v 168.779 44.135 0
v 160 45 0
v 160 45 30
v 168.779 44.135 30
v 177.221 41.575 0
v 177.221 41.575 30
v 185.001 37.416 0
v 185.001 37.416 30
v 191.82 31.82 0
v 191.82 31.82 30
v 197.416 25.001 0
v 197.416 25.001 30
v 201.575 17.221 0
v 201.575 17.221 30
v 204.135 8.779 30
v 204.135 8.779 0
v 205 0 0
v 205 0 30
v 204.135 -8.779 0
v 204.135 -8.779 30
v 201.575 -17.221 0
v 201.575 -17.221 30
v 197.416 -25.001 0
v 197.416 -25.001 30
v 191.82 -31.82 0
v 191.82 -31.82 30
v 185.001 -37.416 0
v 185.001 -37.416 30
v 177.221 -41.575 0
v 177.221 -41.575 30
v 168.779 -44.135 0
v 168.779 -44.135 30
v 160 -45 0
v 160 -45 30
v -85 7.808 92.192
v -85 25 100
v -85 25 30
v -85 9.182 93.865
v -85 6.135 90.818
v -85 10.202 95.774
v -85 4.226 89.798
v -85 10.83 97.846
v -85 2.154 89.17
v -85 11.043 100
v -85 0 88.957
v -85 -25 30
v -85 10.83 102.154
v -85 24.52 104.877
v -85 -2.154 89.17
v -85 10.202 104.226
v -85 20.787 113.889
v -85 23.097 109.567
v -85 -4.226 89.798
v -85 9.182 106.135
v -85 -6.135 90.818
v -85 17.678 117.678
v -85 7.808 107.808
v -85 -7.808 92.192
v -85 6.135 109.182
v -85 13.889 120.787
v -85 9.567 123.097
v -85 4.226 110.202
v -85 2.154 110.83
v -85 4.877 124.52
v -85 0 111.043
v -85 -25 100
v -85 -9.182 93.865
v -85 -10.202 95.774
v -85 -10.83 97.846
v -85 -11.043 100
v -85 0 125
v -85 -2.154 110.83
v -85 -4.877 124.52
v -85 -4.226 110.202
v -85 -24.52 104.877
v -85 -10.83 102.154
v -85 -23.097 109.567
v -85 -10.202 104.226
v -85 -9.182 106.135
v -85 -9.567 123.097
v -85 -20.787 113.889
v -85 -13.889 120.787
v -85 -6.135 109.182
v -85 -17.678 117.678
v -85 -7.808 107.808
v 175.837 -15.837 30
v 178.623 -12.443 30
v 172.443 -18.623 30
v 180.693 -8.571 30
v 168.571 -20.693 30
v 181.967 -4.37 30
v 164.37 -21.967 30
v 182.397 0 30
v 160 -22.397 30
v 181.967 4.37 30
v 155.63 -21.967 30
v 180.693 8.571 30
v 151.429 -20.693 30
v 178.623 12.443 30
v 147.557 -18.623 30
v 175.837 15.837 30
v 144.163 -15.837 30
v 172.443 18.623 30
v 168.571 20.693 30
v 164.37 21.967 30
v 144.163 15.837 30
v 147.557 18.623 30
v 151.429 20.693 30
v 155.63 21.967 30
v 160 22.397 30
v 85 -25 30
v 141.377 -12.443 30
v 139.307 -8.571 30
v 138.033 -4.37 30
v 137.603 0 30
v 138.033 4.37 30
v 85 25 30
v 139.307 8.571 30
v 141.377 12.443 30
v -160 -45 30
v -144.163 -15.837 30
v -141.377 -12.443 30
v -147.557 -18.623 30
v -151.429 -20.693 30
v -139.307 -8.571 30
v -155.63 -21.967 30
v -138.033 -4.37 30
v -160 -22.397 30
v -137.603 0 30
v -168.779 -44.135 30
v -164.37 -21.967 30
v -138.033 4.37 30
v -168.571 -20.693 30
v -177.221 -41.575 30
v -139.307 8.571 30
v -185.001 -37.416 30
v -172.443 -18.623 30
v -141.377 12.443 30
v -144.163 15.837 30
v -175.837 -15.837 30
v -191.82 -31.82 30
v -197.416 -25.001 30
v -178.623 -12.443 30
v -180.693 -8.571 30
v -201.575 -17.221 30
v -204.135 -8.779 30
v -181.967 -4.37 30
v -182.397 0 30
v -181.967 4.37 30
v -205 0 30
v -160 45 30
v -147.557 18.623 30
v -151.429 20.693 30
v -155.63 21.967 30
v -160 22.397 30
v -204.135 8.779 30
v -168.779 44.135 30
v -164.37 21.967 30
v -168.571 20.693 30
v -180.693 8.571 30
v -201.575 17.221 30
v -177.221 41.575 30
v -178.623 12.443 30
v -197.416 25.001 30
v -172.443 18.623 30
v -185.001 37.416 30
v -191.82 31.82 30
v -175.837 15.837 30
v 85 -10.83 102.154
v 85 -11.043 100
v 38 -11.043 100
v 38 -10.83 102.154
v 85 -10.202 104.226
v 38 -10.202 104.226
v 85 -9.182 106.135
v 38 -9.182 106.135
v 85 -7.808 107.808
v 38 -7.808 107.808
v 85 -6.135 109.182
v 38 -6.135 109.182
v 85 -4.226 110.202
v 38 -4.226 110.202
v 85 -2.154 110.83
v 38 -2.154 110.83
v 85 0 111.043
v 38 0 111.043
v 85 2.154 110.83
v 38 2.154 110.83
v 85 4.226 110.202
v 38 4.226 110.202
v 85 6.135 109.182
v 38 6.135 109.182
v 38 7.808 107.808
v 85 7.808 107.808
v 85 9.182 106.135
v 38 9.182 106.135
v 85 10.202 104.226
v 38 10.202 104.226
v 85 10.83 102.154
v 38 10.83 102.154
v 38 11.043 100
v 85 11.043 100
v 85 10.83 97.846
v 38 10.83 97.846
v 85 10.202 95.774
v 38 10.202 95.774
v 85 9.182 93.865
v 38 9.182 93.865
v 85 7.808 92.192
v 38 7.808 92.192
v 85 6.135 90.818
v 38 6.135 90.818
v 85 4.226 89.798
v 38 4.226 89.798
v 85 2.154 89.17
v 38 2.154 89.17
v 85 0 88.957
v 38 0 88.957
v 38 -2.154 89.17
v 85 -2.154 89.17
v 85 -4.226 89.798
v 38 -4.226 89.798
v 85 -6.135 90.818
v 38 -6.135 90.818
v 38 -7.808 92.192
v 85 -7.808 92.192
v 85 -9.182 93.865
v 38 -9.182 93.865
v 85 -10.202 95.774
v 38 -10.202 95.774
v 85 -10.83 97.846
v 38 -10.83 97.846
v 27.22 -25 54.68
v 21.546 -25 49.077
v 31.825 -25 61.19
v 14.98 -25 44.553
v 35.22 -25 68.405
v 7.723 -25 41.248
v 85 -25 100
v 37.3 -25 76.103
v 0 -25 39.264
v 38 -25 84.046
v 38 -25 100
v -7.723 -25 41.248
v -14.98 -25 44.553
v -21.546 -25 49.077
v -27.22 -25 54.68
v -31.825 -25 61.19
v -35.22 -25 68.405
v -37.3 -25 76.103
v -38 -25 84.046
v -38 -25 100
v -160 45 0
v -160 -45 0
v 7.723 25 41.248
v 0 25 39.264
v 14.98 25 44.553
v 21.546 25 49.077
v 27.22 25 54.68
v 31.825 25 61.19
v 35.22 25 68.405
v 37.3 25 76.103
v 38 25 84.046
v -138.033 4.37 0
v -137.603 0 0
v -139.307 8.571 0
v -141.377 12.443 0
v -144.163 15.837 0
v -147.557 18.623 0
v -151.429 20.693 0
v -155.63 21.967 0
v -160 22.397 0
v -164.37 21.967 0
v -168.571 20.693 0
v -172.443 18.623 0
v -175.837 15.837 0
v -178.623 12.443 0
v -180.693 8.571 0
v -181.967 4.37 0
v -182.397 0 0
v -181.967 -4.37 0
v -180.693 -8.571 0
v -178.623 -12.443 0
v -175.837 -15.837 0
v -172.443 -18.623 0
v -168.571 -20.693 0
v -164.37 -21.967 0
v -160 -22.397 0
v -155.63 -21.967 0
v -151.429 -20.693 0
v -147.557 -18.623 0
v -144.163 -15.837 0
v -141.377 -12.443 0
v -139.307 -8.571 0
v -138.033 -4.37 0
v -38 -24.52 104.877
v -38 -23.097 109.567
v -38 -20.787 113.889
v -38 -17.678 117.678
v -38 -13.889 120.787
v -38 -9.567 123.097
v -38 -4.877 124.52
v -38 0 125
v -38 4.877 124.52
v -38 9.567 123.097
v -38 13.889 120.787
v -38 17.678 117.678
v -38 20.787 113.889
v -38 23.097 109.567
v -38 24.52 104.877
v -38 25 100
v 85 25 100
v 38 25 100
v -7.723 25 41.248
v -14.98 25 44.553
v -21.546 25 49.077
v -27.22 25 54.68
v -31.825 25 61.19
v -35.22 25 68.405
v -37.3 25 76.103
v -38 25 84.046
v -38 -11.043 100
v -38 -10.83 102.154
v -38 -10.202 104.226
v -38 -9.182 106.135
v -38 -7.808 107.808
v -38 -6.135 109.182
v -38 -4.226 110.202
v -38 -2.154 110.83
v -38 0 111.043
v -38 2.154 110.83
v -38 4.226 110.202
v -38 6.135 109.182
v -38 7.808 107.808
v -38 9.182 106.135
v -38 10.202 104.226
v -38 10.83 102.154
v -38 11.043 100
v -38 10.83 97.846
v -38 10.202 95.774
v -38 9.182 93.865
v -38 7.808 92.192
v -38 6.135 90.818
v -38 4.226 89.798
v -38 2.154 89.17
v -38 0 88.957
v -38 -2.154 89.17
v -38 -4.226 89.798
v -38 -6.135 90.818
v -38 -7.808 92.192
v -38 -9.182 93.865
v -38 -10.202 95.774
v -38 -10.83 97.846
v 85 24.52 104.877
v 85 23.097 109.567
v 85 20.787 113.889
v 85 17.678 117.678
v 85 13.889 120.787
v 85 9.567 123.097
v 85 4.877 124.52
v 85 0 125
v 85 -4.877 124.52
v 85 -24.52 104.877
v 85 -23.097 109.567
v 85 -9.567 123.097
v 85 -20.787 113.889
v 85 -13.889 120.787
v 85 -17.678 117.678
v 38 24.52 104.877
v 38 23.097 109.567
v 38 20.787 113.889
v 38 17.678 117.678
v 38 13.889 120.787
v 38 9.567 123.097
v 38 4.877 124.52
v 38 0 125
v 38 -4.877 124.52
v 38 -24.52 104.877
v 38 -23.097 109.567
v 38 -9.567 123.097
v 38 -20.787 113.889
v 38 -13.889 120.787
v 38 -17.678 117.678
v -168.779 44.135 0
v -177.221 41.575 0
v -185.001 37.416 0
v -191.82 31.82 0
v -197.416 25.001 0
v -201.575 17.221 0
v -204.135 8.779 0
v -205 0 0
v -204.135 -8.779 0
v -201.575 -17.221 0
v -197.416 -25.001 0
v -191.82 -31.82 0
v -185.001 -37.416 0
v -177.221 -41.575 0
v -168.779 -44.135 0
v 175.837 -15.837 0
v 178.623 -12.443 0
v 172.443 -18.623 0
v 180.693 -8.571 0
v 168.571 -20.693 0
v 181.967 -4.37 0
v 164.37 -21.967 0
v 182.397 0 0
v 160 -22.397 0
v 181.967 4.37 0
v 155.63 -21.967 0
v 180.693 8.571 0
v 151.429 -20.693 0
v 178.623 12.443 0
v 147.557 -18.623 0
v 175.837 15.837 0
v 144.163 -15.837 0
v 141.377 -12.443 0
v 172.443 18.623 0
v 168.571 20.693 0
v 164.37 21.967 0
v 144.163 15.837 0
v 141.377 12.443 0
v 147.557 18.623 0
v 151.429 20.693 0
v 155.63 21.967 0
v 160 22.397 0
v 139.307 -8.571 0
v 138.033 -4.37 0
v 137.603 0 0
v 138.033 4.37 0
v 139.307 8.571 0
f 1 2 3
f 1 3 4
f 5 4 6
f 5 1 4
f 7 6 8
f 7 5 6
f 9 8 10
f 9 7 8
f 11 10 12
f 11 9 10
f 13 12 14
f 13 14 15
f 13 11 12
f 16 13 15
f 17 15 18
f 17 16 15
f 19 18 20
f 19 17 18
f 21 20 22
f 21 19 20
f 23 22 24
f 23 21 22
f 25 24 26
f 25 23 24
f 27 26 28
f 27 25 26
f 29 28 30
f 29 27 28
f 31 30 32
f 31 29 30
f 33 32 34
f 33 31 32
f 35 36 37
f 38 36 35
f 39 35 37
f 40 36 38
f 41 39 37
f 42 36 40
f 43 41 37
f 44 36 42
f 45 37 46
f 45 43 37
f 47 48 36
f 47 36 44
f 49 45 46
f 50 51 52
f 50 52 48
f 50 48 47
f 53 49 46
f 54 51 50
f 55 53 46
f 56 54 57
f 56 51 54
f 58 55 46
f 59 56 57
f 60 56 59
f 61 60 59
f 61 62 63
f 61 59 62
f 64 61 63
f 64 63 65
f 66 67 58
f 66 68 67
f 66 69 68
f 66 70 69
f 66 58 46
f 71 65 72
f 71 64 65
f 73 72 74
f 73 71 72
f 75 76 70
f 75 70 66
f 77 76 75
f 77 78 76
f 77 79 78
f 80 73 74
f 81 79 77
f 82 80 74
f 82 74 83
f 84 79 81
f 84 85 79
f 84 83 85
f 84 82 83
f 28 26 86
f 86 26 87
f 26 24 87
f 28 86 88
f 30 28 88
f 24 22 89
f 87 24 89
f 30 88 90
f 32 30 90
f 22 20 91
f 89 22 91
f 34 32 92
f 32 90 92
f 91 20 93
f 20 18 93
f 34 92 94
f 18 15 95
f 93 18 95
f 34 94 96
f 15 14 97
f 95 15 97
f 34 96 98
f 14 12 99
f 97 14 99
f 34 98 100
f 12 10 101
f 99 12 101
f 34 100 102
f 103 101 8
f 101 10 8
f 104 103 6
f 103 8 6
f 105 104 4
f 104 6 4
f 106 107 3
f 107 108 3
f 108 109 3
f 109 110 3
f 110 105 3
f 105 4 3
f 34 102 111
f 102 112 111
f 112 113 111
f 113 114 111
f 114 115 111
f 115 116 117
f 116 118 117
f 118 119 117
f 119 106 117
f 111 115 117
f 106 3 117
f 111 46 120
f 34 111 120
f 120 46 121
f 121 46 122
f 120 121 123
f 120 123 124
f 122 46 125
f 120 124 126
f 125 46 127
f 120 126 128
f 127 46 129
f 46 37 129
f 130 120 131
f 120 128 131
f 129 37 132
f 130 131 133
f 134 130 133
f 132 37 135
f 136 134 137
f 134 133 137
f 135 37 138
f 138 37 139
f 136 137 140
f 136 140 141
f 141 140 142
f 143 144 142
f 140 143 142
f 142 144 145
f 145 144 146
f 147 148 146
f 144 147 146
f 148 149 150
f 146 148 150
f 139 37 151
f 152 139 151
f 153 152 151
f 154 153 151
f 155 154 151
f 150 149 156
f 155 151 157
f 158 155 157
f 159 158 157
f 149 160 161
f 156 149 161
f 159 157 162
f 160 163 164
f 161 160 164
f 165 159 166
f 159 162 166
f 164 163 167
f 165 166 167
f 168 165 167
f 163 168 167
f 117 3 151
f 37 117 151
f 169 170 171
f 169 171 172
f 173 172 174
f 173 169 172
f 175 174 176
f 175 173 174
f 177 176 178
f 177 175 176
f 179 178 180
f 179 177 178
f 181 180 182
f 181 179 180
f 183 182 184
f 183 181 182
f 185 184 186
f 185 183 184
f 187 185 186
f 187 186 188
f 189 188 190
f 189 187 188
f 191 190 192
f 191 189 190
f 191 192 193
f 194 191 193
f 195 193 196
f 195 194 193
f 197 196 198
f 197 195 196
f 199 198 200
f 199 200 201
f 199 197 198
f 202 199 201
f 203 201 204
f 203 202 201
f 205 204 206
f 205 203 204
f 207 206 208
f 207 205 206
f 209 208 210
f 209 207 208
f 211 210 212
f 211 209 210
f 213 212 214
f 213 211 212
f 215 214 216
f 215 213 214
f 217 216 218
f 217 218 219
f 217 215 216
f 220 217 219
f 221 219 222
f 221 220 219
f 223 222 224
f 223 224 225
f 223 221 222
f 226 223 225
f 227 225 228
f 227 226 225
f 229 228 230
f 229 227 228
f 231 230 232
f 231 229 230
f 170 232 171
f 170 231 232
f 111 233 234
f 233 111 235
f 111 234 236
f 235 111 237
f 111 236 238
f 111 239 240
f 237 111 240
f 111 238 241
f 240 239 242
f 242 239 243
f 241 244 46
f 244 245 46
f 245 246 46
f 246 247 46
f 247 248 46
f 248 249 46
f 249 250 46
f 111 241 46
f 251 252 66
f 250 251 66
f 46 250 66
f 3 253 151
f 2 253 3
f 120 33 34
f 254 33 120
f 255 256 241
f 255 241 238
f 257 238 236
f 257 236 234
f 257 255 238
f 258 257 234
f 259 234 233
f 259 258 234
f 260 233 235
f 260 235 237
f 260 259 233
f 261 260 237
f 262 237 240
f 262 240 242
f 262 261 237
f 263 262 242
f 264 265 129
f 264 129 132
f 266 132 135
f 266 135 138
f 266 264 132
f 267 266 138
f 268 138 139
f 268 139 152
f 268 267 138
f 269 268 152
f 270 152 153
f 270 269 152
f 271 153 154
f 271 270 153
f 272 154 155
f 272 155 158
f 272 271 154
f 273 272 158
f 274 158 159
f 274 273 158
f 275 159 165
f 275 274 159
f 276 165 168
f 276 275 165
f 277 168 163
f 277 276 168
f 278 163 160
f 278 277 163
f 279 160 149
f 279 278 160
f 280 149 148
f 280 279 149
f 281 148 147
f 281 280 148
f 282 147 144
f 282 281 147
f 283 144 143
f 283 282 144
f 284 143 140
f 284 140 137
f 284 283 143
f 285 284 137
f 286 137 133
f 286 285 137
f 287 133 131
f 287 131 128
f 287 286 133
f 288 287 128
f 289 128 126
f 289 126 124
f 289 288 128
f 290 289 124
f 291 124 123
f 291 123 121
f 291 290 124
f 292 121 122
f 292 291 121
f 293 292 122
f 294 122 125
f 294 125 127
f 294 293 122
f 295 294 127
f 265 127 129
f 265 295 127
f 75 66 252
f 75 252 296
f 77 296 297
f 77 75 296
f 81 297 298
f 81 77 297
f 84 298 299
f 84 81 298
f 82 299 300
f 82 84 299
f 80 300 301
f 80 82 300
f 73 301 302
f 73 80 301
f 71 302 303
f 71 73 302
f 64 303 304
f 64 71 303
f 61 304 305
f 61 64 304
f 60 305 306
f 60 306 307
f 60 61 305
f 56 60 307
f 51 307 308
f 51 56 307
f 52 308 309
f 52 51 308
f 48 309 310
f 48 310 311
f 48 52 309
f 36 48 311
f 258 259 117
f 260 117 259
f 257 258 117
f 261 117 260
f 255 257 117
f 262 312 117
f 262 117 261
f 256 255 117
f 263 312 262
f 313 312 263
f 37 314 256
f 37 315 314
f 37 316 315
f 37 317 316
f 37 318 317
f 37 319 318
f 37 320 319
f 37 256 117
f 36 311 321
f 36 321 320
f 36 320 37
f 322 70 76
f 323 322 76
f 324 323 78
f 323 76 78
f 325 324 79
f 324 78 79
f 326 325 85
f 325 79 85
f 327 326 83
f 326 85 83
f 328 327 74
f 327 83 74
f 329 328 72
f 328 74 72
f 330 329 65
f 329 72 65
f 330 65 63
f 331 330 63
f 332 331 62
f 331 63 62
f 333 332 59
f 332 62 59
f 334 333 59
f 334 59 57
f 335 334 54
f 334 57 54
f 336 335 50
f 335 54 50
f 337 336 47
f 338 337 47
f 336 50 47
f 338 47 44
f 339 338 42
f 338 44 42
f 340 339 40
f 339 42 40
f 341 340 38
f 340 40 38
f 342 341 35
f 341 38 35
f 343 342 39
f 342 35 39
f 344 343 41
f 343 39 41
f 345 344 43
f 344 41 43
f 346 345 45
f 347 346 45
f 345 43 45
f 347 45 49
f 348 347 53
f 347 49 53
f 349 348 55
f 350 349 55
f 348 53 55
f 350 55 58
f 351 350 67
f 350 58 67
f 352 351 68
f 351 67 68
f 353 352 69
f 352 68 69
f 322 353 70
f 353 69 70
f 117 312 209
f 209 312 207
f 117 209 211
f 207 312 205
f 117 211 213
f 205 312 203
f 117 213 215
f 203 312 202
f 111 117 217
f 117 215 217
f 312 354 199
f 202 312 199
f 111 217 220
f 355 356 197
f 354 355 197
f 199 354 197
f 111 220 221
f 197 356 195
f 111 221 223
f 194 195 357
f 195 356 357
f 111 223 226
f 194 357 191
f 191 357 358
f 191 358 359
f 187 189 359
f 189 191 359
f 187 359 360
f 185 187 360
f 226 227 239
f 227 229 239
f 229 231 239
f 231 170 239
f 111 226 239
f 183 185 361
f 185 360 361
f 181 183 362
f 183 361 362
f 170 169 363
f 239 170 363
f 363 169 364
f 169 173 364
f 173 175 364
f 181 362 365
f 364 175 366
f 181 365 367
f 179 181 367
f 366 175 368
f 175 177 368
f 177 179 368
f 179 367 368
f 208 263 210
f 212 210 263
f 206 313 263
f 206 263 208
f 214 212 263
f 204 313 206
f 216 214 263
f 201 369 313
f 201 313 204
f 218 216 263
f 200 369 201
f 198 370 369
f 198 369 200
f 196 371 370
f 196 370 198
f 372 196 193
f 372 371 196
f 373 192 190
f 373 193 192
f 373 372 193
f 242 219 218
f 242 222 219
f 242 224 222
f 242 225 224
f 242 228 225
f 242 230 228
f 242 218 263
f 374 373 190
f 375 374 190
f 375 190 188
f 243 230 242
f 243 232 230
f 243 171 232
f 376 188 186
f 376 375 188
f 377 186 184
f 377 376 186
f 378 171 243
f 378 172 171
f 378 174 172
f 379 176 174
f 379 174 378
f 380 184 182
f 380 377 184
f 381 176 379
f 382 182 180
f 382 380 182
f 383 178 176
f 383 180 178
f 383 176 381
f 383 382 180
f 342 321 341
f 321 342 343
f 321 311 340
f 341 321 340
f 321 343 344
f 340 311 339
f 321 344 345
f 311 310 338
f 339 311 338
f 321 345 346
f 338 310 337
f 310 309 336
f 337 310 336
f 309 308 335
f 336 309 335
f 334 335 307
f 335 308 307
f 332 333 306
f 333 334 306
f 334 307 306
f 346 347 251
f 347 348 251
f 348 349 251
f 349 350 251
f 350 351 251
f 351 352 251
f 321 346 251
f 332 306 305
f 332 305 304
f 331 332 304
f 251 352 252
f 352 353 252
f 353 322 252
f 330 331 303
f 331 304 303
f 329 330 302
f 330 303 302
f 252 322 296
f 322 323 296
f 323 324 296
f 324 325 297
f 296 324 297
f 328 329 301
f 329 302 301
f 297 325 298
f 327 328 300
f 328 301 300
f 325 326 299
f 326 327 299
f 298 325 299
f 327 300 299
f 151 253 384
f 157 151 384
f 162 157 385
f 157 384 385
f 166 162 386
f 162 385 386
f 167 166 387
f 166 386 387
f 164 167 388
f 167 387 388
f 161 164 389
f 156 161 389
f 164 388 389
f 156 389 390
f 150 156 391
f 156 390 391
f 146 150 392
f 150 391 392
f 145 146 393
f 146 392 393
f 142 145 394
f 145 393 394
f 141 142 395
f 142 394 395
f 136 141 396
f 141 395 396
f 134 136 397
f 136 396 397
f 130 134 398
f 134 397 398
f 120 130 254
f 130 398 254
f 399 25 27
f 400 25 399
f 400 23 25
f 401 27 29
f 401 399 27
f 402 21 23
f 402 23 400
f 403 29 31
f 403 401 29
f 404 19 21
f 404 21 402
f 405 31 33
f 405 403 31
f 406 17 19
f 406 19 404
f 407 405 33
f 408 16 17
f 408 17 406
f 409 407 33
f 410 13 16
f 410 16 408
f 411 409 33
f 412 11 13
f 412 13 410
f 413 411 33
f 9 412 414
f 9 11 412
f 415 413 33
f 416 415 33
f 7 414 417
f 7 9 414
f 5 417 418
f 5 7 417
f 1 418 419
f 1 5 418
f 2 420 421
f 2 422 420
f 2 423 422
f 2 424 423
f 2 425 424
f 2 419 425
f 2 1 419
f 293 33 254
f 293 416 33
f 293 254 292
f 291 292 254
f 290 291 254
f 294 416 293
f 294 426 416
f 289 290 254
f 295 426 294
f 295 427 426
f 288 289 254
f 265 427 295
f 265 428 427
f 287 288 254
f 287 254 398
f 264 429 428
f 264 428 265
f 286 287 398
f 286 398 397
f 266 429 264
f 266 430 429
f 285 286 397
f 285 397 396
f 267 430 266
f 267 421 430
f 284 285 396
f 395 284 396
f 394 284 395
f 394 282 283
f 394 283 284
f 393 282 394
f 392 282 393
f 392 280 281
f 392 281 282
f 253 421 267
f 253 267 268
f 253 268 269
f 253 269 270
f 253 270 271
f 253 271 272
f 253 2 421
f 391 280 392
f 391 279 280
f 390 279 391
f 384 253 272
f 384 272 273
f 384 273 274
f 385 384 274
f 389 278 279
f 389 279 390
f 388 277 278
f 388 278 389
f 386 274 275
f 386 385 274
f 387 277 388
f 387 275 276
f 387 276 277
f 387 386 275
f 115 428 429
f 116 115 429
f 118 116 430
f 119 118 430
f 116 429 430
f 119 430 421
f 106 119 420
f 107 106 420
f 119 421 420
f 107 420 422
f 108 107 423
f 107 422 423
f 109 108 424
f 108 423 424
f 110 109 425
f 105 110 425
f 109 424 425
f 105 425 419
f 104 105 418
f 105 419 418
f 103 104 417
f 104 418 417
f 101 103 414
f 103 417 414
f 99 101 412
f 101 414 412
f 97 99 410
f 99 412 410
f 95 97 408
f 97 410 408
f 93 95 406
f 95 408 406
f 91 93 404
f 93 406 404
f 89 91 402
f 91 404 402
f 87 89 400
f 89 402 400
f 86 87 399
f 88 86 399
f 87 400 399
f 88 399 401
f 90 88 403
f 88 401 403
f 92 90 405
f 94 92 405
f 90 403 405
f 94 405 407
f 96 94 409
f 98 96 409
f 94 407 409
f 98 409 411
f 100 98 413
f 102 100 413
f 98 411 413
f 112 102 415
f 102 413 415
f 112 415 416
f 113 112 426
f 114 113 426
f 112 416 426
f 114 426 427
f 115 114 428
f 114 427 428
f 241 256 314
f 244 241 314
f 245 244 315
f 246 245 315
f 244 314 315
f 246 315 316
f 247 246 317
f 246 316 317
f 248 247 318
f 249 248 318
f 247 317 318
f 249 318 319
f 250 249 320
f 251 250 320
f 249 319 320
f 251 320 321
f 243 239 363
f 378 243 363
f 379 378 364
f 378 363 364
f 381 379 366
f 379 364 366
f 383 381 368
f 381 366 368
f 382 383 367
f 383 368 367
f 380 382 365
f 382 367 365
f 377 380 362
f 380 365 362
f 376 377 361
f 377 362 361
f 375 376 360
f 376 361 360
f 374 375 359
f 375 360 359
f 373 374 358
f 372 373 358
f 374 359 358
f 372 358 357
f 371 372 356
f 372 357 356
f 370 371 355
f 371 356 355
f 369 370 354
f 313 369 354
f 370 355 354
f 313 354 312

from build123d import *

# Parameters (mm, degrees)
F0_R        = 22.3974192725
F1_DEPTH    = 30
F2_W        = 85
F2_H        = 50
F3_DEPTH    = 70
F4_W        = 38
F4_H        = 60.7357084751
F5_DEPTH    = 50
F6_T1_DEPTH = 50
F8_DEPTH    = 47
F9_R        = 11.0426148683
F10_DEPTH   = 47


# Not quite as in the source:
# - a fillet or chamfer that OpenCascade refuses, or shapes differently, is made with other operations: its cross-section is extruded or revolved along the edge and cut away or added


with BuildPart() as f1:
    # F0 (on Top) → F1 (new body)
    with BuildSketch(Plane.XY):
        with BuildLine():
            Line((0, 0), (0, 45))
            Line((0, 45), (-160, 45))
            ThreePointArc((-160, 45), (-205, 0), (-160, -45))
            Line((-160, -45), (0, -45))
            Line((0, -45), (0, 0))
        make_face()
        with Locations((-160, 0)):
            Circle(F0_R, mode=Mode.SUBTRACT)
    extrude(amount=F1_DEPTH)

    # F2 (on face) → F3 (join)
    with BuildSketch(Plane.XY.offset(30)):
        with Locations((-42.5, 0)):
            Rectangle(F2_W, F2_H)
    extrude(amount=F3_DEPTH)

    # F4 (on face) → F5 (cut)
    with BuildSketch(Plane.XZ.offset(25)):
        with Locations((-19, 69.6321457624)):
            Rectangle(F4_W, F4_H)
    extrude(amount=-F5_DEPTH, mode=Mode.SUBTRACT)

    # F6: fillet of radius 45.3872149726 on 1 edges, made by hand

    # F6_s2 → F6_t1 (join)
    with BuildSketch(Plane.XZ.offset(-25)):
        with BuildLine():
            ThreePointArc((0, 39.2642915249), (-27.2197525121, 54.6803835575), (-38, 84.0463006125))
            Line((-38, 84.0463006125), (-38, 39.2642915249))
            Line((-38, 39.2642915249), (0, 39.2642915249))
        make_face()
    extrude(amount=F6_T1_DEPTH)

    # F7 (on face) → F8 (join)
    with BuildSketch(Plane(origin=(-85, 0, 0), x_dir=(0, -1, 0), z_dir=(-1, 0, 0))):
        with BuildLine():
            Line((-25, 100), (25, 100))
            ThreePointArc((25, 100), (0, 125), (-25, 100))
        make_face()
    extrude(amount=-F8_DEPTH)

    # F9 (on face) → F10 (cut)
    with BuildSketch(Plane(origin=(-85, 0, 0), x_dir=(0, -1, 0), z_dir=(-1, 0, 0))):
        with Locations((0, 100)):
            Circle(F9_R)
    extrude(amount=-F10_DEPTH, mode=Mode.SUBTRACT)

    # F11: F1 across face


with BuildPart() as f1_1:
    add(f1.part)
    add(f1.part.mirror(Plane(origin=(0, 0, 17.8748906724), x_dir=(0, 1, 0), z_dir=(1, 0, 0))))


solid = f1_1.part
